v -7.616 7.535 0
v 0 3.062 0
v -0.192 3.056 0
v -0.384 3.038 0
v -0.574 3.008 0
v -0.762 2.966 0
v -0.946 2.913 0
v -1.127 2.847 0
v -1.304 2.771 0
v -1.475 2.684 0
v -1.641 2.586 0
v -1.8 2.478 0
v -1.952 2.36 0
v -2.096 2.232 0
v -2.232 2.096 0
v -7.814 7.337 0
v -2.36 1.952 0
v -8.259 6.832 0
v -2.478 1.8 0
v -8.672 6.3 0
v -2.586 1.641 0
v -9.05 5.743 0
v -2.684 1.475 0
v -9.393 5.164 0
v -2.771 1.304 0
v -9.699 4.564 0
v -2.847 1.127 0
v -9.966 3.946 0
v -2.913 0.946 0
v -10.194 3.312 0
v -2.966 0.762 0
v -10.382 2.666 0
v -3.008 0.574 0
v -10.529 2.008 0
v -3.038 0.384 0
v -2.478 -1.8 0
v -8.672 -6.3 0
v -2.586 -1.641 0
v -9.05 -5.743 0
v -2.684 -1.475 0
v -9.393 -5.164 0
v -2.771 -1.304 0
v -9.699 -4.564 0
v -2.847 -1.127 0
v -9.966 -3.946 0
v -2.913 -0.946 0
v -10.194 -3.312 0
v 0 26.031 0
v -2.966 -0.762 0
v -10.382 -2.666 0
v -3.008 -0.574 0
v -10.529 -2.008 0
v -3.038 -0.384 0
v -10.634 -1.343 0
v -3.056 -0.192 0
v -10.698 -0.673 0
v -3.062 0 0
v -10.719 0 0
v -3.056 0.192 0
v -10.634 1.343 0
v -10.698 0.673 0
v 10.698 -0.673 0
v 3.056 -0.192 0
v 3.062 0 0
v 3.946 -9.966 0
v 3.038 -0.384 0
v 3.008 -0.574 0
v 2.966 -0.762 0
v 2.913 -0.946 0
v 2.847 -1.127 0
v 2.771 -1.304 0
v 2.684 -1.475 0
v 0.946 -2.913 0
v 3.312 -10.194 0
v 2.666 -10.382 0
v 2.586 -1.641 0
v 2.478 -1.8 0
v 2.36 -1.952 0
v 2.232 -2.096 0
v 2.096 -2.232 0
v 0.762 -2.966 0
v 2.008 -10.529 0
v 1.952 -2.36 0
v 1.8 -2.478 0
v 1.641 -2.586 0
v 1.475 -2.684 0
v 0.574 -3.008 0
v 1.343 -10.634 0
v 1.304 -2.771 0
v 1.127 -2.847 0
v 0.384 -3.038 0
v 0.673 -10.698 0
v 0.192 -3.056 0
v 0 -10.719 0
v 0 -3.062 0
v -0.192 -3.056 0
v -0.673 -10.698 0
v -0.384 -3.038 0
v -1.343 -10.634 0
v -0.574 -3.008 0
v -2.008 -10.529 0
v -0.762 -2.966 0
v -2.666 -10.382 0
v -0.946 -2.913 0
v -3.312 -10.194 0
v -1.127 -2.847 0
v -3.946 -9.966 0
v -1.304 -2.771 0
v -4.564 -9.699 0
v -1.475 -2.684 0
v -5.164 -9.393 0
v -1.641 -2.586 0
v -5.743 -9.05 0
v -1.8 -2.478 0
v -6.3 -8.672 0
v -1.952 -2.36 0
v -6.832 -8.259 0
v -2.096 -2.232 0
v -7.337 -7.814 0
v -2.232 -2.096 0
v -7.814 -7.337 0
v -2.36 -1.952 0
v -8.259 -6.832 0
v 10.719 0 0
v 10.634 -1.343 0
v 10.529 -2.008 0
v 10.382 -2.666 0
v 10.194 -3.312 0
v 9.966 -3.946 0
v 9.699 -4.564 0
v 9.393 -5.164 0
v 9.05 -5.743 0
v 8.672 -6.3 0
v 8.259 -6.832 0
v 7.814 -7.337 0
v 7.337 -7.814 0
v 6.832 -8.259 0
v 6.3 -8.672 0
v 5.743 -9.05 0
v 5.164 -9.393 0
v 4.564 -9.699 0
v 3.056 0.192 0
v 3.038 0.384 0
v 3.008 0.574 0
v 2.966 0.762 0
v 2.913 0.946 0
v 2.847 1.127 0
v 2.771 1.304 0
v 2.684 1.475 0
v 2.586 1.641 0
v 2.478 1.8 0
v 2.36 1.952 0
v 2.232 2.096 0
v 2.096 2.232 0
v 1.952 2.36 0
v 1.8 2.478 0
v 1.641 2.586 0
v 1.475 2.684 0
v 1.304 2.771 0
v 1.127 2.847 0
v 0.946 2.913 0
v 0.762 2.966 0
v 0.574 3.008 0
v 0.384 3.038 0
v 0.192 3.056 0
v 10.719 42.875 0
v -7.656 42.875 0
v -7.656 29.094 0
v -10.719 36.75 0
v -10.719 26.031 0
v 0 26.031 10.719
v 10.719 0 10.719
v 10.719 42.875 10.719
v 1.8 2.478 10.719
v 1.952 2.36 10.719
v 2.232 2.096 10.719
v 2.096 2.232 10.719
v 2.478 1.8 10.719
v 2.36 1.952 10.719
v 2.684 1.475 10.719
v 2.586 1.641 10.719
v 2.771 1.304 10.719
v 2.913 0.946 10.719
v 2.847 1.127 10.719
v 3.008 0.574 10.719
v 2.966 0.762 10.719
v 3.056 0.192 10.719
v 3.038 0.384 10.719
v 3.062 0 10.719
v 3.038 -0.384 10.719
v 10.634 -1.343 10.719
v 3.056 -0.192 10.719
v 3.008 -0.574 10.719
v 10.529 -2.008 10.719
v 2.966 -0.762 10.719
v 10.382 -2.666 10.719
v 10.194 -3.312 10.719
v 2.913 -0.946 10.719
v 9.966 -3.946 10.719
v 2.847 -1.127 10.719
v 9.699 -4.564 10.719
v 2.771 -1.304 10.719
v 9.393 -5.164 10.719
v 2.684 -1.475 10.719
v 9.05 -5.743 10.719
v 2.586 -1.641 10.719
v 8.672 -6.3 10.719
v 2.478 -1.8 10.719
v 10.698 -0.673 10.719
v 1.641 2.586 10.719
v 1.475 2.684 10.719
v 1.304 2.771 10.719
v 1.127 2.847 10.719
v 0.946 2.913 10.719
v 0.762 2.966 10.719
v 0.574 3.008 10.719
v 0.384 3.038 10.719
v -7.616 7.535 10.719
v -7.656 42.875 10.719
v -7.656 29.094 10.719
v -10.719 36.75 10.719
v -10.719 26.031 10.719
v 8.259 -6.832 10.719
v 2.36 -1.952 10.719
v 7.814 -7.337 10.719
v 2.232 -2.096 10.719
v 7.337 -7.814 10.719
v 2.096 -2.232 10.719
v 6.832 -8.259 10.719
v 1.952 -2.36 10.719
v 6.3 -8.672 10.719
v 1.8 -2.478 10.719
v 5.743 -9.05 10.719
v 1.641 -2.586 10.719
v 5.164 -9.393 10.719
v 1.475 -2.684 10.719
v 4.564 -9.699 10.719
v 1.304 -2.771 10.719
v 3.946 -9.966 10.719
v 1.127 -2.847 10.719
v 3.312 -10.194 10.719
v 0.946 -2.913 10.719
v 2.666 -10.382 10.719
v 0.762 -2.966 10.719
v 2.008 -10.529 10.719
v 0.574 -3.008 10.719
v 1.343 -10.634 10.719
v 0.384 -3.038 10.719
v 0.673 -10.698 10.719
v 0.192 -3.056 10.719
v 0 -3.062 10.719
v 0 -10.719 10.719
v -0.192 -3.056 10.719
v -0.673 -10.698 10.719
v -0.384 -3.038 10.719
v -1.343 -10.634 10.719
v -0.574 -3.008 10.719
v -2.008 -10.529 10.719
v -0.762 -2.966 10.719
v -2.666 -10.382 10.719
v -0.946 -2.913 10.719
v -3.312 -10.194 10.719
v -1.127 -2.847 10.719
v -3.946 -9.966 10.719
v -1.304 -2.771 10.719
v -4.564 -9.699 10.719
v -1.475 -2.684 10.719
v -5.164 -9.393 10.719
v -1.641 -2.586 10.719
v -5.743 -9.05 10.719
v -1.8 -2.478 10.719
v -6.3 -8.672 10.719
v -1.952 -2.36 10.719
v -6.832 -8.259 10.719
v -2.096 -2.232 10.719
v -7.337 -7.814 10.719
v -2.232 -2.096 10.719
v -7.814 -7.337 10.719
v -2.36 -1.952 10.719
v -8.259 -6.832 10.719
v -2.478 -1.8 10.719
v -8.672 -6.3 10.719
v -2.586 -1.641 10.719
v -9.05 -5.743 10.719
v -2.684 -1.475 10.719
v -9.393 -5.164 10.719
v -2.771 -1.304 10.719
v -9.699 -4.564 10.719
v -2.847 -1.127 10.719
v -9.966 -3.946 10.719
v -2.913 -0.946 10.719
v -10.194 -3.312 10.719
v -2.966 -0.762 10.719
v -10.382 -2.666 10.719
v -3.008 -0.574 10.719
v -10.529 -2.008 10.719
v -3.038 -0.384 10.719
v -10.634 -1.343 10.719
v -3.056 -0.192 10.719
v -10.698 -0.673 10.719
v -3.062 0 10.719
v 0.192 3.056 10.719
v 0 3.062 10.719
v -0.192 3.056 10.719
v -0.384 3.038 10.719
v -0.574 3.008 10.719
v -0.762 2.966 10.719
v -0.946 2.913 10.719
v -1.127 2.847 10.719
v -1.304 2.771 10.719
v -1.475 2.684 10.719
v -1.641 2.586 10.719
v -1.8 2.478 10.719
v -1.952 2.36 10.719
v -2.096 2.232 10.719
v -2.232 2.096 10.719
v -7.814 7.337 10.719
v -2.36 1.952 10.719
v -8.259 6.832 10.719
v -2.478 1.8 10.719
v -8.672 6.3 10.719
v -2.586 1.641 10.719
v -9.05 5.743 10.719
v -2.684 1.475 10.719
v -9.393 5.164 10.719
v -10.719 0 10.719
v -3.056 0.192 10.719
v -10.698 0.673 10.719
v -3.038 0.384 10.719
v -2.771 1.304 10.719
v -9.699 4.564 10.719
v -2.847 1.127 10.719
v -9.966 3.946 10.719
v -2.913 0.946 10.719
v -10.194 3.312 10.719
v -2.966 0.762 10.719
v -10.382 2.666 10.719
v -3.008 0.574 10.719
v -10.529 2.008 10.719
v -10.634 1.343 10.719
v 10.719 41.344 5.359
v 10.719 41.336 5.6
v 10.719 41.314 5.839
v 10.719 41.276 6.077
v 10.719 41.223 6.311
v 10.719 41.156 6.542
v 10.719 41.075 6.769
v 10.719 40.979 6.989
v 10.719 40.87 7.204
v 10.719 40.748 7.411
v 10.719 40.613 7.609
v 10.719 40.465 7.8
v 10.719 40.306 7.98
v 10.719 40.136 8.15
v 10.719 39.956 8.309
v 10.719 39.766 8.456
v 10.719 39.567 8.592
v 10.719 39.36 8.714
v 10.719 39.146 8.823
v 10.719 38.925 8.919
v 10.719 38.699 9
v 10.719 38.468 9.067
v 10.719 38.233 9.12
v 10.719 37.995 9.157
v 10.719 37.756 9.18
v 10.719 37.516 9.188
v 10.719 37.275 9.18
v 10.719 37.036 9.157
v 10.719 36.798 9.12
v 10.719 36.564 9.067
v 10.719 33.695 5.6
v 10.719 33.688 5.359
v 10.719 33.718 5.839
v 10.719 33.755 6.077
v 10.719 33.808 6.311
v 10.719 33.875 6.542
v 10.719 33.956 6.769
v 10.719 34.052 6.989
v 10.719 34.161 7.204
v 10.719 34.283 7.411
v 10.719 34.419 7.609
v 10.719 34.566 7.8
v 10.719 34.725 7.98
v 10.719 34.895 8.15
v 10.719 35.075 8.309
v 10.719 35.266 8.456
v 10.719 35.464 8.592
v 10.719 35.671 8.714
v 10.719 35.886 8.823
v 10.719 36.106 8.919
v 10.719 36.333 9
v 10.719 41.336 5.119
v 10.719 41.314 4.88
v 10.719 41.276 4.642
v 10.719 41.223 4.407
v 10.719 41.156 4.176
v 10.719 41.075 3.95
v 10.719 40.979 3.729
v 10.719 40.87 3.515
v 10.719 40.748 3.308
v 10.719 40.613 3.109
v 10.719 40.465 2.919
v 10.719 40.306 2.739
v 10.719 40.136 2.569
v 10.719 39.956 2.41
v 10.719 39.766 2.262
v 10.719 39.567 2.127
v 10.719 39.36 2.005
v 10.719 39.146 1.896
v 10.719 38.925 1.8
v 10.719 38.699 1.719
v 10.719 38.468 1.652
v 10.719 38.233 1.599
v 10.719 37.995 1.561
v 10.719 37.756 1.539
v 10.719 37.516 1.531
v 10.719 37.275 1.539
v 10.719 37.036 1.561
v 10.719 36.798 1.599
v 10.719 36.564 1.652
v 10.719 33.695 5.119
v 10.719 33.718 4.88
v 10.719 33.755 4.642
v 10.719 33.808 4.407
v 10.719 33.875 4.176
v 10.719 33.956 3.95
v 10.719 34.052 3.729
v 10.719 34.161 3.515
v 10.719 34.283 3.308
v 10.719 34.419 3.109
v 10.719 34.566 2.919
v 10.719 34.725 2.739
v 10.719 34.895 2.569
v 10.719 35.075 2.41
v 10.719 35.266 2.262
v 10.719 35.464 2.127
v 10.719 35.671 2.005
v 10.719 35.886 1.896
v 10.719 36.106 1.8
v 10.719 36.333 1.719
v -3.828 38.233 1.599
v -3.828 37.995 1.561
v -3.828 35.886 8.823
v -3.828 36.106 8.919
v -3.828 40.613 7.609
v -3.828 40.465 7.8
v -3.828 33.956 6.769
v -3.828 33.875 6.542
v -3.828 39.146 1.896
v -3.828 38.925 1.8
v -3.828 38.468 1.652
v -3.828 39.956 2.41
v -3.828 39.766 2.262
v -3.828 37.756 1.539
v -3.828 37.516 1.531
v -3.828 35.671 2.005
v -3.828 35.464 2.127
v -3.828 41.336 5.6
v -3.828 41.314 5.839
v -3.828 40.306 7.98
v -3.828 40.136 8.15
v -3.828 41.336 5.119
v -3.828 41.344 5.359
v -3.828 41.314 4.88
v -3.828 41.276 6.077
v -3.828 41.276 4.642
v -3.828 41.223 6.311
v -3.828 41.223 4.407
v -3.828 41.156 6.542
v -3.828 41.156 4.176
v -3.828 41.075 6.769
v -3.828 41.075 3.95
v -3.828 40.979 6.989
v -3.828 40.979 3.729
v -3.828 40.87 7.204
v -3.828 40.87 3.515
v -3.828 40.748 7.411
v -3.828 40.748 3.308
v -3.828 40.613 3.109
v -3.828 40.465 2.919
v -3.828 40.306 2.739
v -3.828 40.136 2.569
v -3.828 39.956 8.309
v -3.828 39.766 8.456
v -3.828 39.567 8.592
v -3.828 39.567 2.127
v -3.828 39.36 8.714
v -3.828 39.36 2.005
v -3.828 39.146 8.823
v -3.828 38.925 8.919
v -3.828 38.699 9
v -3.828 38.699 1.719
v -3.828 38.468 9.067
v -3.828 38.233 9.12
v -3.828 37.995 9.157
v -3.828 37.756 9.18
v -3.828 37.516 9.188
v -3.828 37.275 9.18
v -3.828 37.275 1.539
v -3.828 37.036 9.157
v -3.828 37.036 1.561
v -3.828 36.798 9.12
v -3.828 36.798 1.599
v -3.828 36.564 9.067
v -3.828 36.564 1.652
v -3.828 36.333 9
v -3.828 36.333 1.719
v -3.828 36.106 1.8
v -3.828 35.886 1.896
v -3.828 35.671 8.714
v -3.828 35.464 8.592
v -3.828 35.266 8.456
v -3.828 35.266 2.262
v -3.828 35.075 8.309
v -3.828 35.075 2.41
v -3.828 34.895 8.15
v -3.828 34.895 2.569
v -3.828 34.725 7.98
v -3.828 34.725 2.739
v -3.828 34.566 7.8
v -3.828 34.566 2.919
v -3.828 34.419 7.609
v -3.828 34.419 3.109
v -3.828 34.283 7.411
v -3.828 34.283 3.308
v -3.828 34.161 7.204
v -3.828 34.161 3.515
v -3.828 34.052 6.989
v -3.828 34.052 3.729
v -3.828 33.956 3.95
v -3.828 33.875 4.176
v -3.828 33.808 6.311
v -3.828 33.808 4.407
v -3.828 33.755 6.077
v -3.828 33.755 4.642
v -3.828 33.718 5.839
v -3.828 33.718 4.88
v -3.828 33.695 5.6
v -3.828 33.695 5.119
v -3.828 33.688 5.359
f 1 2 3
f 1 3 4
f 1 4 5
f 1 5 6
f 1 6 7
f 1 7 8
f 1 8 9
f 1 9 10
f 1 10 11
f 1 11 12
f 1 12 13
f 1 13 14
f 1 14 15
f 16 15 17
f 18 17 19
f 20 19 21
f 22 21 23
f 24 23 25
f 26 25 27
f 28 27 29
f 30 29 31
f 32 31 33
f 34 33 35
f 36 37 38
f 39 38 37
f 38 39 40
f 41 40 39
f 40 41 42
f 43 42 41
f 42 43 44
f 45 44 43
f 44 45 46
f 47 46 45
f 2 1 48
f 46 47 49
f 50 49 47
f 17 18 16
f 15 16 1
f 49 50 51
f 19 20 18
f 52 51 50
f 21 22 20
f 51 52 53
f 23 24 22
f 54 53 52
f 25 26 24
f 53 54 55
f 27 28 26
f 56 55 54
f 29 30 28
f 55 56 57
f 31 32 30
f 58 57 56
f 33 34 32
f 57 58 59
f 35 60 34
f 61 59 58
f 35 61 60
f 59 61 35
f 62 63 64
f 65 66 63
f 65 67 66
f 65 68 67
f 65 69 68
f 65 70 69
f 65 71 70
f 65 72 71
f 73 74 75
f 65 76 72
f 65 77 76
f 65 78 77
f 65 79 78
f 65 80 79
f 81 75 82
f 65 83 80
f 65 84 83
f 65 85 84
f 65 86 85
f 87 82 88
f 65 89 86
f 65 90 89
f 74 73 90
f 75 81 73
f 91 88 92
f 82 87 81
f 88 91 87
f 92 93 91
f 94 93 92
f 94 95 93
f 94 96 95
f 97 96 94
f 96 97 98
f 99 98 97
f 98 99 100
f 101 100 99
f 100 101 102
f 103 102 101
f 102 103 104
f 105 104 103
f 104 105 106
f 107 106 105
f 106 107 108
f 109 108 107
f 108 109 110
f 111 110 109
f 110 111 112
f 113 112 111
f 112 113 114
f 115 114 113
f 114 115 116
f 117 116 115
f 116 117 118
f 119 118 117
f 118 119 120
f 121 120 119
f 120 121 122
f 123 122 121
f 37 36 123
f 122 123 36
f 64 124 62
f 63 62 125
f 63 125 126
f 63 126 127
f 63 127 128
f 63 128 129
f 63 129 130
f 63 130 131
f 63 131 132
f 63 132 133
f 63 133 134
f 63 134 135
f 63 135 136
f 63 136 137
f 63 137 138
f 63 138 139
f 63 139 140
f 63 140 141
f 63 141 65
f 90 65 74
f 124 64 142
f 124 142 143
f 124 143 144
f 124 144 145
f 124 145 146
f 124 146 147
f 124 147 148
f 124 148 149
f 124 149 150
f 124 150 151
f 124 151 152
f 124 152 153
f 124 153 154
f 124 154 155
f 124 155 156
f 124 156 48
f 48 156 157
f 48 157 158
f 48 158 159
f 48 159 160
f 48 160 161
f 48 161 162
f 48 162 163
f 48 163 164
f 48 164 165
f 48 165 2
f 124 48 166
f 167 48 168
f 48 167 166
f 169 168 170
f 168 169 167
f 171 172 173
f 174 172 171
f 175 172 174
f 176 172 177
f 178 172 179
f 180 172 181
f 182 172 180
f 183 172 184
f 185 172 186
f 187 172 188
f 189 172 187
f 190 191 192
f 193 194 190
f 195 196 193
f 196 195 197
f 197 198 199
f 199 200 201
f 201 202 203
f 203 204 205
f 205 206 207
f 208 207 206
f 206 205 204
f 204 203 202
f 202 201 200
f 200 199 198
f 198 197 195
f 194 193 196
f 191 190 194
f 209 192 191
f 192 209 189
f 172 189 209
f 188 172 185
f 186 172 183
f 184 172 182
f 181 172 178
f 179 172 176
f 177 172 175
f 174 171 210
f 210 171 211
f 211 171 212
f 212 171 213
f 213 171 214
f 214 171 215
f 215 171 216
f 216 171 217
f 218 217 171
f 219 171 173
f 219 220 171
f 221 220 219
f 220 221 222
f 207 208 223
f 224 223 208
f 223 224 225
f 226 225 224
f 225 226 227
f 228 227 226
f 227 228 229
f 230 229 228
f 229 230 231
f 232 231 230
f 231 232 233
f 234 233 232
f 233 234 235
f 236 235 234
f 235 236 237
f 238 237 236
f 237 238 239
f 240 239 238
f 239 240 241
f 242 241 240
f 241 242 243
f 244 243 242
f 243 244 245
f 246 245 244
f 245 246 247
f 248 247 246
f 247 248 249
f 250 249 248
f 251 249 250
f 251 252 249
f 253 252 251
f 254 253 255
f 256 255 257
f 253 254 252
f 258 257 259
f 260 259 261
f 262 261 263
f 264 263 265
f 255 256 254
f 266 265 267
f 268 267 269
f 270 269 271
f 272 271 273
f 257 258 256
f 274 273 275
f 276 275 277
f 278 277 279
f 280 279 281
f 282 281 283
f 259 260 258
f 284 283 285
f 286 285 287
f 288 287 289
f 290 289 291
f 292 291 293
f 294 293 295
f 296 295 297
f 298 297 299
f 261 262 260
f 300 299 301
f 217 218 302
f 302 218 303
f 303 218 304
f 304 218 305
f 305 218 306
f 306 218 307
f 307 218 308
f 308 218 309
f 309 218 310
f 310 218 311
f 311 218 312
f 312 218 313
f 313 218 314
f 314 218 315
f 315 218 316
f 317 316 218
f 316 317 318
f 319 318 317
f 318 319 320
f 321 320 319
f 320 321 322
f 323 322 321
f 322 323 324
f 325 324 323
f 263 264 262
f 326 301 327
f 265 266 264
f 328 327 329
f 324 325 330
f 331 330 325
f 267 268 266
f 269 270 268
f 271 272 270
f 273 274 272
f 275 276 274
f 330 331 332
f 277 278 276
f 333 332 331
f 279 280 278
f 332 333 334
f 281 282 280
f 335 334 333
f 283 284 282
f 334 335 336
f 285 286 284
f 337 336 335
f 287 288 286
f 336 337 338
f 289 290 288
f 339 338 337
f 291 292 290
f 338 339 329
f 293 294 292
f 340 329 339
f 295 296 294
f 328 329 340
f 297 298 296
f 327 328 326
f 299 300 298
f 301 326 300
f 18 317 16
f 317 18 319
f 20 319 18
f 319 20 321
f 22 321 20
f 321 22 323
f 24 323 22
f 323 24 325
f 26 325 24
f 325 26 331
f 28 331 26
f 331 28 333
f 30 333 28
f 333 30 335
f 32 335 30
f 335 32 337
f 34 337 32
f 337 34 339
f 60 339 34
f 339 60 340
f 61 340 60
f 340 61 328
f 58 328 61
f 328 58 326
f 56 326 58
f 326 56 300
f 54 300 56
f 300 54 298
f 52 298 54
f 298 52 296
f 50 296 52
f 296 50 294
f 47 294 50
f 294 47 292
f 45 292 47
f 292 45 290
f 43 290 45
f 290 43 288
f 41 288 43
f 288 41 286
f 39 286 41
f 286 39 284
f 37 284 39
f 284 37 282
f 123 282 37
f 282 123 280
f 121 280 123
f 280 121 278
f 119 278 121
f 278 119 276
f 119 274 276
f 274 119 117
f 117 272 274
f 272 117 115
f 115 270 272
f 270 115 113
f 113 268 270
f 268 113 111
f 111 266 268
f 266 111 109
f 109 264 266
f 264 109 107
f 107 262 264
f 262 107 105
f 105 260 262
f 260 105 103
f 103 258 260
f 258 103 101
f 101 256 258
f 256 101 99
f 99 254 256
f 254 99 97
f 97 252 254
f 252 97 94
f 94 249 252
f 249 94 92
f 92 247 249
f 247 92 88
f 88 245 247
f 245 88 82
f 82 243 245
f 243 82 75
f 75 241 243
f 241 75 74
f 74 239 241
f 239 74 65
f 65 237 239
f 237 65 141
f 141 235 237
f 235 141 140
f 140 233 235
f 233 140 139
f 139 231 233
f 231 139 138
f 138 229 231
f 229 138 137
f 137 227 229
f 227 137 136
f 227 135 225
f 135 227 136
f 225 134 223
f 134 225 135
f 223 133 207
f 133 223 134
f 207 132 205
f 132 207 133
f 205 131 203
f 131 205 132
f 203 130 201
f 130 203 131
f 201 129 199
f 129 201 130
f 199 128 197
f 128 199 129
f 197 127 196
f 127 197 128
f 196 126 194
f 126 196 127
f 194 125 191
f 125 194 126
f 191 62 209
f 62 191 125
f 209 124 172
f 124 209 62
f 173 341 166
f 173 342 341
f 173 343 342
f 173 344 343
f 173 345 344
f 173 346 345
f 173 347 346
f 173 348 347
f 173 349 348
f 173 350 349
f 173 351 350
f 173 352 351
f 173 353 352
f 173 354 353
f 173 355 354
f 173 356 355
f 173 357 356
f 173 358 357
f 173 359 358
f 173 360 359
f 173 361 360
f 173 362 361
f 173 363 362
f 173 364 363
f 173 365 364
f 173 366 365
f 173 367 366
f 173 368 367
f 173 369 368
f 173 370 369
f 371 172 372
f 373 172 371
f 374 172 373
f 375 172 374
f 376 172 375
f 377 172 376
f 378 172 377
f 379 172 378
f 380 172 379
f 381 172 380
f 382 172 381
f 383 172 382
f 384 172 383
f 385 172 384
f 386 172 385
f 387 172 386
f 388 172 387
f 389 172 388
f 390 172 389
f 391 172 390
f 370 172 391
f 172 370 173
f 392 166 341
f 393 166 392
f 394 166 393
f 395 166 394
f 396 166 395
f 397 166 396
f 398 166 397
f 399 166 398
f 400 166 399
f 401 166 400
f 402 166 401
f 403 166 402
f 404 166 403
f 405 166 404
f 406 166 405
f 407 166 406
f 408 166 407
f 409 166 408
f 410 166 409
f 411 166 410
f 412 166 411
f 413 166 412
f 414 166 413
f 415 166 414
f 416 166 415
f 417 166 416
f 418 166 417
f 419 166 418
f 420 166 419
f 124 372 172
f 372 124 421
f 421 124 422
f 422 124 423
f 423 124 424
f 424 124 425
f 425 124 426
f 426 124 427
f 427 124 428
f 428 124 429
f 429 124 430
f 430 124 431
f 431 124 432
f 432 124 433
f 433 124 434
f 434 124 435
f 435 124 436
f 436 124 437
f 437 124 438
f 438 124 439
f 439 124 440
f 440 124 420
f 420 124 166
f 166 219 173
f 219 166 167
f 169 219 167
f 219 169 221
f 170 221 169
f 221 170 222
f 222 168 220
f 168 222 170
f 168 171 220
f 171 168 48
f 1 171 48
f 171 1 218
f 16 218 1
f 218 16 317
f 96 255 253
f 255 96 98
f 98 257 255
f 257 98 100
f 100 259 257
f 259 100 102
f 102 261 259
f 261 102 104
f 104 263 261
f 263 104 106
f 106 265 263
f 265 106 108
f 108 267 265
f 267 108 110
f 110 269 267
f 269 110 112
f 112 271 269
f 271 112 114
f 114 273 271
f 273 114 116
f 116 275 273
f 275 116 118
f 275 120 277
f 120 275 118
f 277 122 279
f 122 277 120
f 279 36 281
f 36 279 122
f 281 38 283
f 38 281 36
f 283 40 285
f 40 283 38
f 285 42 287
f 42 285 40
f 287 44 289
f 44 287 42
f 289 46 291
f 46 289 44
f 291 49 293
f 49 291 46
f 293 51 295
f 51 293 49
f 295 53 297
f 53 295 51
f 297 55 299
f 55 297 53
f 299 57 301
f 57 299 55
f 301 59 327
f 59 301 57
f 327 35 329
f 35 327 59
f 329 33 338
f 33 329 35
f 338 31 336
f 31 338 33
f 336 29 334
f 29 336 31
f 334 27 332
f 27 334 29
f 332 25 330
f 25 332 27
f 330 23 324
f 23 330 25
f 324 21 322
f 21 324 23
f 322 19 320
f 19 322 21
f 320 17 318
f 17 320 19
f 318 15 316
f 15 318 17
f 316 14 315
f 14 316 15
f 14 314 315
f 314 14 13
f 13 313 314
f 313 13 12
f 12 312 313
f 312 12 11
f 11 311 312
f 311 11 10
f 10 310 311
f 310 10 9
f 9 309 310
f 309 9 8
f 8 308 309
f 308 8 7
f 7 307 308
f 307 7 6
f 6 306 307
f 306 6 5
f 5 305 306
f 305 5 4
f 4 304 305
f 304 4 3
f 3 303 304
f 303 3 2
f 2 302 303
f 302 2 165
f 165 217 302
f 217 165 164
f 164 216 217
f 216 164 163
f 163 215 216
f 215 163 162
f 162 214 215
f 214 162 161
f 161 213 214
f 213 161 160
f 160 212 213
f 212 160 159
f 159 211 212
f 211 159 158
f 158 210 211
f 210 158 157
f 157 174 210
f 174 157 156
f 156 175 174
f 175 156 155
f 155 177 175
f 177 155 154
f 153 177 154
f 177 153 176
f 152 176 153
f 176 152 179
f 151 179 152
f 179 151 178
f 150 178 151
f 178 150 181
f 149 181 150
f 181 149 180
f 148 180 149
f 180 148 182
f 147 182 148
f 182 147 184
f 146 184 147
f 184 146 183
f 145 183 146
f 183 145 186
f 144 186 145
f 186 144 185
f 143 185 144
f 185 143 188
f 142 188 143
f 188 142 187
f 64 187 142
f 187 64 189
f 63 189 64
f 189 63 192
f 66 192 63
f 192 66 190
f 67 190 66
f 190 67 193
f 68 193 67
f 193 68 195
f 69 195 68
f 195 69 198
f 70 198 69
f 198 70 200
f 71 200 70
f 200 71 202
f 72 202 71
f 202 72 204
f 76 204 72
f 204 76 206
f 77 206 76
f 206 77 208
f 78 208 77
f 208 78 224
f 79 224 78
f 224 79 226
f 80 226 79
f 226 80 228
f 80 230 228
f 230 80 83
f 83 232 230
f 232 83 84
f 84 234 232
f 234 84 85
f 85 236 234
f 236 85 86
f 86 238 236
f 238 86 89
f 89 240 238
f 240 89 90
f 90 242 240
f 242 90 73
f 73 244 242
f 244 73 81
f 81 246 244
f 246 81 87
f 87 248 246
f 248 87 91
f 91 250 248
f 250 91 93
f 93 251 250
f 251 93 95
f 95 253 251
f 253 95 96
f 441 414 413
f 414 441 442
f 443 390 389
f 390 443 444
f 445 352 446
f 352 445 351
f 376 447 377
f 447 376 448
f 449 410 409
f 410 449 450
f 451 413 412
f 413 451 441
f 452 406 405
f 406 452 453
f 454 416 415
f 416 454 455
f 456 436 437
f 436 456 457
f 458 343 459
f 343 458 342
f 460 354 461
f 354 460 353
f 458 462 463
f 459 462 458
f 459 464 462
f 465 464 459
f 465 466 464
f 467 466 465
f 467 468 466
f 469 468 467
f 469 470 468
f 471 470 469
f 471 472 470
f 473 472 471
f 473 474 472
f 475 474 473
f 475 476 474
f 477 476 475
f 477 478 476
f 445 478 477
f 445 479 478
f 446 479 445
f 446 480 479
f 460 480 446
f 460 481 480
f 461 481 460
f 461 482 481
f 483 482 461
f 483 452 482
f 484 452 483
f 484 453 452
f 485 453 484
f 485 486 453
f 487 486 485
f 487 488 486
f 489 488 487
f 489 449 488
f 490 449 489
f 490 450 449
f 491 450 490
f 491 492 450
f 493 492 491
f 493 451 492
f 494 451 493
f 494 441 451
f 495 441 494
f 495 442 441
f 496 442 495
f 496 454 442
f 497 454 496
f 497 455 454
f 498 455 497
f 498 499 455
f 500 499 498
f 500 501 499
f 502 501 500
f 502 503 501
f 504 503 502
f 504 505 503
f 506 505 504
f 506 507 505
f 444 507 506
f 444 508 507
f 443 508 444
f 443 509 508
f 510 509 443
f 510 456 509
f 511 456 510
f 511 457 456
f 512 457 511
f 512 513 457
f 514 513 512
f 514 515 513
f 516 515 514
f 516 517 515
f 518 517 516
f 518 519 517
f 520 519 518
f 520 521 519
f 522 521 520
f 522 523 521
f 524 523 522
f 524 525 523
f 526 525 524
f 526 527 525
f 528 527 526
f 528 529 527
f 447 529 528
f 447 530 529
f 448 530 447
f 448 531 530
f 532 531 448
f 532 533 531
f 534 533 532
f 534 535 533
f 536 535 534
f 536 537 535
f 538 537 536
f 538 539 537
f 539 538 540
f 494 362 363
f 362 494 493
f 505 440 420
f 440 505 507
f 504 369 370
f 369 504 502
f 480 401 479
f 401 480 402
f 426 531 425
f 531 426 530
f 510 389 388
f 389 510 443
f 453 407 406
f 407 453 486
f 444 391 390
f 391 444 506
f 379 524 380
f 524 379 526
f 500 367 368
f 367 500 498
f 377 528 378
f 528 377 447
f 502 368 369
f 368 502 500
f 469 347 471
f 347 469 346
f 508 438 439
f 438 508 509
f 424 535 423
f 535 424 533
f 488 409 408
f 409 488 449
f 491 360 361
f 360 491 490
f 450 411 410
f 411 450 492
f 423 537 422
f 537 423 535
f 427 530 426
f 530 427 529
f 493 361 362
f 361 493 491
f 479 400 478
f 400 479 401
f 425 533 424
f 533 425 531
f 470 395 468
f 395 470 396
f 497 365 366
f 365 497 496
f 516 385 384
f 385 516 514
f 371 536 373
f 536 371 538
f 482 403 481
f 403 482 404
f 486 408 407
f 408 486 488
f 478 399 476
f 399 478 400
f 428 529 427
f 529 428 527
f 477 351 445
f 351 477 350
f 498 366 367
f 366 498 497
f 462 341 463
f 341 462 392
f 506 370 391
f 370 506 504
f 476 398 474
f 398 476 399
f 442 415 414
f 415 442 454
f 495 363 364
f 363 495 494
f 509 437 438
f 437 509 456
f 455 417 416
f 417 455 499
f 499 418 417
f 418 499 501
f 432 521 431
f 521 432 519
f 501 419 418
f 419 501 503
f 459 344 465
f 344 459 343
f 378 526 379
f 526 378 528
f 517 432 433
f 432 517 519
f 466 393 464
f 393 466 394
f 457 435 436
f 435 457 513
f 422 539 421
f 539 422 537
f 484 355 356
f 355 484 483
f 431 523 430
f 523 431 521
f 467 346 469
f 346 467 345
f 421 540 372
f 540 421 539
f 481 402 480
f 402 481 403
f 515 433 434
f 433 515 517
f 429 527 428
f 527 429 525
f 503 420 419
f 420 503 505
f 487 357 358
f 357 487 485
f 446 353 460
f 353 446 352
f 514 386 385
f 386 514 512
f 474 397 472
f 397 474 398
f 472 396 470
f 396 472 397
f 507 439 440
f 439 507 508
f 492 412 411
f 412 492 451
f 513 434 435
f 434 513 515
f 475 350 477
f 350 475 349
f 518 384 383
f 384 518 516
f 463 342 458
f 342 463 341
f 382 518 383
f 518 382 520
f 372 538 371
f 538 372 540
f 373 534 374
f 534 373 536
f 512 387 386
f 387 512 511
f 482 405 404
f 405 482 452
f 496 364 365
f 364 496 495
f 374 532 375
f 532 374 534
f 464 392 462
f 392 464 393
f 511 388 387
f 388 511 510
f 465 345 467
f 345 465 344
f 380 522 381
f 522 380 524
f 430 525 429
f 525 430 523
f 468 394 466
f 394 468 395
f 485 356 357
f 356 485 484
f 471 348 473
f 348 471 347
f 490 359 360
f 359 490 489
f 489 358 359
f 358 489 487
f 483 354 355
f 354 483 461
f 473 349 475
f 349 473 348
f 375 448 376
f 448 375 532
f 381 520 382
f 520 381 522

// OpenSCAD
module latch() {
    buttDiameter = 14;
    buttRadius = buttDiameter/2;
    stemLength = 17;
    latchLength = 28;
    hingeHoleDiameter = 4;
    toothWidth = 2;
    scaleFactor = 24.5 / 16;
    resolution = 100;
    tongueHoleDiameter = 5;
    tongueHoleRadius = tongueHoleDiameter / 2;
    tongueHoleDepth = 10;
    latchWidth = buttDiameter / 2;
    tongueHoleMargin = 1;
    
    module _hingeSide() {
        difference() {
            union() {
                circle(d=buttDiameter);
                polygon(points=[
                    [-buttRadius, 0],
                    [buttRadius, 0],
                    [buttRadius, stemLength],
                    [0, stemLength],
                ]);
            };
            circle(d=hingeHoleDiameter);
        };
    };
    
    module _tongueSide() {
        
        polygon(points=[
            [0, stemLength],
            [-buttRadius+toothWidth, stemLength+2],
            [-buttRadius, stemLength],
            [-buttRadius, latchLength-4],
            [-buttRadius+toothWidth, latchLength],
            [buttRadius, latchLength],
            [buttRadius, stemLength],
        ]);
    }
    
    scale(v=[scaleFactor, scaleFactor, scaleFactor]) {
        difference() {
            linear_extrude(height=7, $fn=resolution) {
                union() {
                    _hingeSide();
                    _tongueSide();
                };
            };
            translate([
                -tongueHoleDepth/4,
                latchLength-tongueHoleRadius-tongueHoleMargin,
                latchWidth/2,
            ]) {
                rotate([0, 90, 0]) {
                    cylinder(
                        r=tongueHoleRadius, 
                        h=tongueHoleDepth + 0.15, 
                        $fn=resolution
                    );
                };
            };
        }
    }
}

latch();
    
